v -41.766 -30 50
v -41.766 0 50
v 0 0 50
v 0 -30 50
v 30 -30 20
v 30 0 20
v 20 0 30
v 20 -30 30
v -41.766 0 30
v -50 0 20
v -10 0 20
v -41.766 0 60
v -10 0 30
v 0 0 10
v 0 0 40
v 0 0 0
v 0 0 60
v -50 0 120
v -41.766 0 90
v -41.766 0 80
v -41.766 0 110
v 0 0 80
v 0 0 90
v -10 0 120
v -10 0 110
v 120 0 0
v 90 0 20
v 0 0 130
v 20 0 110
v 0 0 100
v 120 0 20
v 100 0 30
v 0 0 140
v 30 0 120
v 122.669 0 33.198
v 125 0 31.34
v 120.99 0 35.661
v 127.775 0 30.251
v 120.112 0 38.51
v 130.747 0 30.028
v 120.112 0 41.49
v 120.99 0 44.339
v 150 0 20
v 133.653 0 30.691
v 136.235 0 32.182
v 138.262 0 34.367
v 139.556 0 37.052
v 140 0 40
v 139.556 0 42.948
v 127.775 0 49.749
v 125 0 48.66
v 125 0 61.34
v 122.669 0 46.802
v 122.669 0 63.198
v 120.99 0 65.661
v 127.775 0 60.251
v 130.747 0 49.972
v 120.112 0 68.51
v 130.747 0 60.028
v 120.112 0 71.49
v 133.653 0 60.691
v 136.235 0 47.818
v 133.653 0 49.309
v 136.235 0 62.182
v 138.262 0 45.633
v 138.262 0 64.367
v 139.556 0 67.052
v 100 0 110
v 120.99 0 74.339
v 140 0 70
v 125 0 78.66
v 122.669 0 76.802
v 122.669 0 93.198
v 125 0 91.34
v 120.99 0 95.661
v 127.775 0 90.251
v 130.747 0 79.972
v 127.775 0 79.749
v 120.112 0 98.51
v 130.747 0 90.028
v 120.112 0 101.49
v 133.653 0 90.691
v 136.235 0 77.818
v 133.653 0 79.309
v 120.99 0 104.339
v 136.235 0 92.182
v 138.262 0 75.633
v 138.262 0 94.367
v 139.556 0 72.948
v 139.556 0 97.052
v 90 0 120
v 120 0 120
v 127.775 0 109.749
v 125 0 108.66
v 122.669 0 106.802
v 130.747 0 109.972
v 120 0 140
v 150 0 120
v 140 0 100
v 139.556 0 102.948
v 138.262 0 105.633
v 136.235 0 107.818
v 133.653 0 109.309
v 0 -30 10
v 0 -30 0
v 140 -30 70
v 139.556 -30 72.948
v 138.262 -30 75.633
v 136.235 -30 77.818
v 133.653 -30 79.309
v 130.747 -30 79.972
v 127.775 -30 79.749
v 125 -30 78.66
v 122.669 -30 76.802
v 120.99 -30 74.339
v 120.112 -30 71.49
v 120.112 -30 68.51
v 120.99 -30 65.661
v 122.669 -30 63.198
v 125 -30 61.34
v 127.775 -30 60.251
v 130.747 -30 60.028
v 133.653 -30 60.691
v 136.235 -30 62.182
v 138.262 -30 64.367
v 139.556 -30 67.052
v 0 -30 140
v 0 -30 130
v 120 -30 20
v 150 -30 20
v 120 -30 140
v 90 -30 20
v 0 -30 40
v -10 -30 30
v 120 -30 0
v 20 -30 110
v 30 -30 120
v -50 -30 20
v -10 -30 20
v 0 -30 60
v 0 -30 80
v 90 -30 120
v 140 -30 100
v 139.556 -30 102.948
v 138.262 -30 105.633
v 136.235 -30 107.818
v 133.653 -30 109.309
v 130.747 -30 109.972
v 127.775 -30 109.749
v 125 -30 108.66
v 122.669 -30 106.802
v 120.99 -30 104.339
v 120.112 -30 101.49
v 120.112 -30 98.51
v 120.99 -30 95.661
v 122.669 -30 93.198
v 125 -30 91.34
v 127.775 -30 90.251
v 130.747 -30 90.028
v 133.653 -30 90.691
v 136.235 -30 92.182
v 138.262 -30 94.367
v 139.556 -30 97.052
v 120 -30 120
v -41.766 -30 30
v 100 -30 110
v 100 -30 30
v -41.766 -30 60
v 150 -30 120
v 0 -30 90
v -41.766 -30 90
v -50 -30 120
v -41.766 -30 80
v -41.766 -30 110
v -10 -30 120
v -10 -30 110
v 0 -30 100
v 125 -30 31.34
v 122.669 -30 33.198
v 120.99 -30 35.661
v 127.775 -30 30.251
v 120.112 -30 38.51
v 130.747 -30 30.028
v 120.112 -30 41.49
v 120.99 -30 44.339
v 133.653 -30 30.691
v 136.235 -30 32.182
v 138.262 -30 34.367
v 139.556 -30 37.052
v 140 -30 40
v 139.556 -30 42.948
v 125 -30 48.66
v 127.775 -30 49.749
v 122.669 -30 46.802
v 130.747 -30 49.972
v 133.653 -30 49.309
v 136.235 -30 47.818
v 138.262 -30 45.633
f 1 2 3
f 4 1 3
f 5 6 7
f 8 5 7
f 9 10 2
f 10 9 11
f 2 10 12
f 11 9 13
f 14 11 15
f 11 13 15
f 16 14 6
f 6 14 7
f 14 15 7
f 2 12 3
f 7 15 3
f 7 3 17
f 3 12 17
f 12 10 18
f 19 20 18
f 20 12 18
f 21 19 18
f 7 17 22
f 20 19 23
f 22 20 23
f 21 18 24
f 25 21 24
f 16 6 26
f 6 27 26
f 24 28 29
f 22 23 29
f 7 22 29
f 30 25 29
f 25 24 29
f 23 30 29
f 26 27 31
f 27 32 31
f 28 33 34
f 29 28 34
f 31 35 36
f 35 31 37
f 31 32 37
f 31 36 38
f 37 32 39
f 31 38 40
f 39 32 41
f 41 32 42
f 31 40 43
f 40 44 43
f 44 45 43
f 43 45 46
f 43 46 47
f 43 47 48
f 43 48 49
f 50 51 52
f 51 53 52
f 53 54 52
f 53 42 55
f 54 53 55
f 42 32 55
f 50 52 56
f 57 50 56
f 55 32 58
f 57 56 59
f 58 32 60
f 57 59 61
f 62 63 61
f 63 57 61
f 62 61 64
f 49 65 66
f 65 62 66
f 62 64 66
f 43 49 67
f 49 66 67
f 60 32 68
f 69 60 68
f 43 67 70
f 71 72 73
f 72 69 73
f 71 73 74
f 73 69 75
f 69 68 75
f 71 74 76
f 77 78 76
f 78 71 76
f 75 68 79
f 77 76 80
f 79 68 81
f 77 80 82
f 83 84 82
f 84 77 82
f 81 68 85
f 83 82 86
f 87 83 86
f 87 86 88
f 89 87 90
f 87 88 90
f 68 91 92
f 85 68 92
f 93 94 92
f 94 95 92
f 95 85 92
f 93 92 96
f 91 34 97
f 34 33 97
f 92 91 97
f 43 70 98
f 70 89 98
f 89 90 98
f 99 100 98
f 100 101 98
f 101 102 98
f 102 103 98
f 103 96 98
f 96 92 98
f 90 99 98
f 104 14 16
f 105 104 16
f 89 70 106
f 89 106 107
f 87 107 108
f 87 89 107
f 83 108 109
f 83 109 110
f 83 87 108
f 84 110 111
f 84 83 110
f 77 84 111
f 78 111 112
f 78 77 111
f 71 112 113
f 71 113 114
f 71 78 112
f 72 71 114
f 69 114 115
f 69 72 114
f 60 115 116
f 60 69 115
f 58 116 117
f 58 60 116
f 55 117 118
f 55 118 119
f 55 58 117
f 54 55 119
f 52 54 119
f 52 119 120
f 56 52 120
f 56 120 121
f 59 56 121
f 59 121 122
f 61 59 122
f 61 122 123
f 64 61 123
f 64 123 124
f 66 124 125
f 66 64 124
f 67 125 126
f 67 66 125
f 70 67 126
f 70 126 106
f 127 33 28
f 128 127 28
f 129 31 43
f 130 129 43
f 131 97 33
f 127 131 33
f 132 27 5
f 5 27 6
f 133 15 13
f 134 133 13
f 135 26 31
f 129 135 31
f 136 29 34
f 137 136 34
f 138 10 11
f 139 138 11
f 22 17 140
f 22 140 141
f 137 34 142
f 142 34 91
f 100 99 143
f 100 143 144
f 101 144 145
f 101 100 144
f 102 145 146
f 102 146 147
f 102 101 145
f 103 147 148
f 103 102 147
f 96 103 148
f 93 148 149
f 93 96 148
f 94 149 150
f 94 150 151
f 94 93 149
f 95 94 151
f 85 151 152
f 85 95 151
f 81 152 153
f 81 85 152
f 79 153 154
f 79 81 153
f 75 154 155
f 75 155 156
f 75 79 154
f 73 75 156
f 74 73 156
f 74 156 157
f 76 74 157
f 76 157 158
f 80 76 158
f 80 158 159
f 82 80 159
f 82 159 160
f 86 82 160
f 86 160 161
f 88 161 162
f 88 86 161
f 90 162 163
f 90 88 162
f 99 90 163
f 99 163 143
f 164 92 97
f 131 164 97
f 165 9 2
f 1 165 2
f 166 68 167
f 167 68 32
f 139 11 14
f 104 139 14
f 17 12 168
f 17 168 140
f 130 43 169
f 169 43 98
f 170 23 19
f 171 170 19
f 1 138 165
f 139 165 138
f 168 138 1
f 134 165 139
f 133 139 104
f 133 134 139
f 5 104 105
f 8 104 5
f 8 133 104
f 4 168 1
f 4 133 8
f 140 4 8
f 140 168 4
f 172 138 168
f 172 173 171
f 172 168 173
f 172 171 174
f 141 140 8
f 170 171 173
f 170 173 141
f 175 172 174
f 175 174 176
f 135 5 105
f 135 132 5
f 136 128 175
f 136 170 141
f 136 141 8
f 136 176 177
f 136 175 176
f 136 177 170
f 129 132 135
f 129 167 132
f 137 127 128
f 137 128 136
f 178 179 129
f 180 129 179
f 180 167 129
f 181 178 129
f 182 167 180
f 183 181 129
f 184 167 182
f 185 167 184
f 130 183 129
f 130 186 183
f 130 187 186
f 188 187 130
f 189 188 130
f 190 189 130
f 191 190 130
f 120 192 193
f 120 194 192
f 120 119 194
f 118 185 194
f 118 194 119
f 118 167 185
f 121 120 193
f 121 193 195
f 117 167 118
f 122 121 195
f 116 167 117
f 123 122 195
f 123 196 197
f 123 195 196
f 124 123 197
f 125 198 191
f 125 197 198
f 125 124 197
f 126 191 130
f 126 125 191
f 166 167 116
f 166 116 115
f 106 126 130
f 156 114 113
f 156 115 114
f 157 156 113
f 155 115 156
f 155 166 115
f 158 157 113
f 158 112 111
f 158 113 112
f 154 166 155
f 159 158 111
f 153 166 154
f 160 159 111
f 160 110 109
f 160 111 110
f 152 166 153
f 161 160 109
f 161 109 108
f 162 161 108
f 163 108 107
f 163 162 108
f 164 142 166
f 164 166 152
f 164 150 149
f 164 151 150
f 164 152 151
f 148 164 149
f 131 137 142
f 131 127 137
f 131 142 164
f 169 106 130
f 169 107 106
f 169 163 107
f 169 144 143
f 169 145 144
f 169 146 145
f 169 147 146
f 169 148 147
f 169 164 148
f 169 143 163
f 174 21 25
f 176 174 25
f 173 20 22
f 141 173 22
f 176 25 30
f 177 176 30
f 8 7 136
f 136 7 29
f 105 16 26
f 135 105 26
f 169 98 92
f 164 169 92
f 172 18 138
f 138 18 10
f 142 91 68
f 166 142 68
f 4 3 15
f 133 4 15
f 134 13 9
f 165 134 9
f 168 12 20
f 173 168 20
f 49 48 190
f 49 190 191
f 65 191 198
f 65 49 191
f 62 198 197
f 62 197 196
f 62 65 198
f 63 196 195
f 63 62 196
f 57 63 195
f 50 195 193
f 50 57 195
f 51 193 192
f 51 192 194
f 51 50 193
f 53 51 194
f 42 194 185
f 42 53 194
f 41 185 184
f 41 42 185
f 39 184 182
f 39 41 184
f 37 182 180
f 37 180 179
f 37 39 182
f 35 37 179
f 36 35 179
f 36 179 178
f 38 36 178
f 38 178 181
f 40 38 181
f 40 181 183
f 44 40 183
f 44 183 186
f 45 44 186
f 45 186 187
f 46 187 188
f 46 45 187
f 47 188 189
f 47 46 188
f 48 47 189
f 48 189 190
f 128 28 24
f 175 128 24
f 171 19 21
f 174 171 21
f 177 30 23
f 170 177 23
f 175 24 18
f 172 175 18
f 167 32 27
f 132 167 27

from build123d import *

# Parameters (mm, degrees)
F0_R     = 10
F0_W     = 41.765921
F0_H     = 20
F1_DEPTH = 30


with BuildPart() as f1:
    # F0 (on Front) → F1 (new body)
    with BuildSketch(Plane.XZ):
        Polygon((0, 10), (0, 0), (120, 0), (120, 20), (150, 20), (150, 120), (120, 120), (120, 140), (0, 140), (0, 130), (-10, 120), (-19.487179, 120), (-50, 120), (-50, 20), (-19.487179, 20), (-10, 20), align=None)
        Polygon((-41.765921, 30), (-41.765921, 50), (0, 50), (0, 40), (-10, 30), align=None, mode=Mode.SUBTRACT)
        with Locations((130, 40)):
            Circle(F0_R, mode=Mode.SUBTRACT)
        with Locations((-20.88296, 70)):
            Rectangle(F0_W, F0_H, mode=Mode.SUBTRACT)
        Polygon((-41.765921, 90), (-41.765921, 110), (-10, 110), (0, 100), (0, 90), align=None, mode=Mode.SUBTRACT)
        Polygon((20, 110), (30, 120), (90, 120), (100, 110), (100, 30), (90, 20), (30, 20), (20, 30), align=None, mode=Mode.SUBTRACT)
        with Locations((130, 70)):
            Circle(F0_R, mode=Mode.SUBTRACT)
        with Locations((130, 100)):
            Circle(F0_R, mode=Mode.SUBTRACT)
    extrude(amount=F1_DEPTH)


solid = f1.part
